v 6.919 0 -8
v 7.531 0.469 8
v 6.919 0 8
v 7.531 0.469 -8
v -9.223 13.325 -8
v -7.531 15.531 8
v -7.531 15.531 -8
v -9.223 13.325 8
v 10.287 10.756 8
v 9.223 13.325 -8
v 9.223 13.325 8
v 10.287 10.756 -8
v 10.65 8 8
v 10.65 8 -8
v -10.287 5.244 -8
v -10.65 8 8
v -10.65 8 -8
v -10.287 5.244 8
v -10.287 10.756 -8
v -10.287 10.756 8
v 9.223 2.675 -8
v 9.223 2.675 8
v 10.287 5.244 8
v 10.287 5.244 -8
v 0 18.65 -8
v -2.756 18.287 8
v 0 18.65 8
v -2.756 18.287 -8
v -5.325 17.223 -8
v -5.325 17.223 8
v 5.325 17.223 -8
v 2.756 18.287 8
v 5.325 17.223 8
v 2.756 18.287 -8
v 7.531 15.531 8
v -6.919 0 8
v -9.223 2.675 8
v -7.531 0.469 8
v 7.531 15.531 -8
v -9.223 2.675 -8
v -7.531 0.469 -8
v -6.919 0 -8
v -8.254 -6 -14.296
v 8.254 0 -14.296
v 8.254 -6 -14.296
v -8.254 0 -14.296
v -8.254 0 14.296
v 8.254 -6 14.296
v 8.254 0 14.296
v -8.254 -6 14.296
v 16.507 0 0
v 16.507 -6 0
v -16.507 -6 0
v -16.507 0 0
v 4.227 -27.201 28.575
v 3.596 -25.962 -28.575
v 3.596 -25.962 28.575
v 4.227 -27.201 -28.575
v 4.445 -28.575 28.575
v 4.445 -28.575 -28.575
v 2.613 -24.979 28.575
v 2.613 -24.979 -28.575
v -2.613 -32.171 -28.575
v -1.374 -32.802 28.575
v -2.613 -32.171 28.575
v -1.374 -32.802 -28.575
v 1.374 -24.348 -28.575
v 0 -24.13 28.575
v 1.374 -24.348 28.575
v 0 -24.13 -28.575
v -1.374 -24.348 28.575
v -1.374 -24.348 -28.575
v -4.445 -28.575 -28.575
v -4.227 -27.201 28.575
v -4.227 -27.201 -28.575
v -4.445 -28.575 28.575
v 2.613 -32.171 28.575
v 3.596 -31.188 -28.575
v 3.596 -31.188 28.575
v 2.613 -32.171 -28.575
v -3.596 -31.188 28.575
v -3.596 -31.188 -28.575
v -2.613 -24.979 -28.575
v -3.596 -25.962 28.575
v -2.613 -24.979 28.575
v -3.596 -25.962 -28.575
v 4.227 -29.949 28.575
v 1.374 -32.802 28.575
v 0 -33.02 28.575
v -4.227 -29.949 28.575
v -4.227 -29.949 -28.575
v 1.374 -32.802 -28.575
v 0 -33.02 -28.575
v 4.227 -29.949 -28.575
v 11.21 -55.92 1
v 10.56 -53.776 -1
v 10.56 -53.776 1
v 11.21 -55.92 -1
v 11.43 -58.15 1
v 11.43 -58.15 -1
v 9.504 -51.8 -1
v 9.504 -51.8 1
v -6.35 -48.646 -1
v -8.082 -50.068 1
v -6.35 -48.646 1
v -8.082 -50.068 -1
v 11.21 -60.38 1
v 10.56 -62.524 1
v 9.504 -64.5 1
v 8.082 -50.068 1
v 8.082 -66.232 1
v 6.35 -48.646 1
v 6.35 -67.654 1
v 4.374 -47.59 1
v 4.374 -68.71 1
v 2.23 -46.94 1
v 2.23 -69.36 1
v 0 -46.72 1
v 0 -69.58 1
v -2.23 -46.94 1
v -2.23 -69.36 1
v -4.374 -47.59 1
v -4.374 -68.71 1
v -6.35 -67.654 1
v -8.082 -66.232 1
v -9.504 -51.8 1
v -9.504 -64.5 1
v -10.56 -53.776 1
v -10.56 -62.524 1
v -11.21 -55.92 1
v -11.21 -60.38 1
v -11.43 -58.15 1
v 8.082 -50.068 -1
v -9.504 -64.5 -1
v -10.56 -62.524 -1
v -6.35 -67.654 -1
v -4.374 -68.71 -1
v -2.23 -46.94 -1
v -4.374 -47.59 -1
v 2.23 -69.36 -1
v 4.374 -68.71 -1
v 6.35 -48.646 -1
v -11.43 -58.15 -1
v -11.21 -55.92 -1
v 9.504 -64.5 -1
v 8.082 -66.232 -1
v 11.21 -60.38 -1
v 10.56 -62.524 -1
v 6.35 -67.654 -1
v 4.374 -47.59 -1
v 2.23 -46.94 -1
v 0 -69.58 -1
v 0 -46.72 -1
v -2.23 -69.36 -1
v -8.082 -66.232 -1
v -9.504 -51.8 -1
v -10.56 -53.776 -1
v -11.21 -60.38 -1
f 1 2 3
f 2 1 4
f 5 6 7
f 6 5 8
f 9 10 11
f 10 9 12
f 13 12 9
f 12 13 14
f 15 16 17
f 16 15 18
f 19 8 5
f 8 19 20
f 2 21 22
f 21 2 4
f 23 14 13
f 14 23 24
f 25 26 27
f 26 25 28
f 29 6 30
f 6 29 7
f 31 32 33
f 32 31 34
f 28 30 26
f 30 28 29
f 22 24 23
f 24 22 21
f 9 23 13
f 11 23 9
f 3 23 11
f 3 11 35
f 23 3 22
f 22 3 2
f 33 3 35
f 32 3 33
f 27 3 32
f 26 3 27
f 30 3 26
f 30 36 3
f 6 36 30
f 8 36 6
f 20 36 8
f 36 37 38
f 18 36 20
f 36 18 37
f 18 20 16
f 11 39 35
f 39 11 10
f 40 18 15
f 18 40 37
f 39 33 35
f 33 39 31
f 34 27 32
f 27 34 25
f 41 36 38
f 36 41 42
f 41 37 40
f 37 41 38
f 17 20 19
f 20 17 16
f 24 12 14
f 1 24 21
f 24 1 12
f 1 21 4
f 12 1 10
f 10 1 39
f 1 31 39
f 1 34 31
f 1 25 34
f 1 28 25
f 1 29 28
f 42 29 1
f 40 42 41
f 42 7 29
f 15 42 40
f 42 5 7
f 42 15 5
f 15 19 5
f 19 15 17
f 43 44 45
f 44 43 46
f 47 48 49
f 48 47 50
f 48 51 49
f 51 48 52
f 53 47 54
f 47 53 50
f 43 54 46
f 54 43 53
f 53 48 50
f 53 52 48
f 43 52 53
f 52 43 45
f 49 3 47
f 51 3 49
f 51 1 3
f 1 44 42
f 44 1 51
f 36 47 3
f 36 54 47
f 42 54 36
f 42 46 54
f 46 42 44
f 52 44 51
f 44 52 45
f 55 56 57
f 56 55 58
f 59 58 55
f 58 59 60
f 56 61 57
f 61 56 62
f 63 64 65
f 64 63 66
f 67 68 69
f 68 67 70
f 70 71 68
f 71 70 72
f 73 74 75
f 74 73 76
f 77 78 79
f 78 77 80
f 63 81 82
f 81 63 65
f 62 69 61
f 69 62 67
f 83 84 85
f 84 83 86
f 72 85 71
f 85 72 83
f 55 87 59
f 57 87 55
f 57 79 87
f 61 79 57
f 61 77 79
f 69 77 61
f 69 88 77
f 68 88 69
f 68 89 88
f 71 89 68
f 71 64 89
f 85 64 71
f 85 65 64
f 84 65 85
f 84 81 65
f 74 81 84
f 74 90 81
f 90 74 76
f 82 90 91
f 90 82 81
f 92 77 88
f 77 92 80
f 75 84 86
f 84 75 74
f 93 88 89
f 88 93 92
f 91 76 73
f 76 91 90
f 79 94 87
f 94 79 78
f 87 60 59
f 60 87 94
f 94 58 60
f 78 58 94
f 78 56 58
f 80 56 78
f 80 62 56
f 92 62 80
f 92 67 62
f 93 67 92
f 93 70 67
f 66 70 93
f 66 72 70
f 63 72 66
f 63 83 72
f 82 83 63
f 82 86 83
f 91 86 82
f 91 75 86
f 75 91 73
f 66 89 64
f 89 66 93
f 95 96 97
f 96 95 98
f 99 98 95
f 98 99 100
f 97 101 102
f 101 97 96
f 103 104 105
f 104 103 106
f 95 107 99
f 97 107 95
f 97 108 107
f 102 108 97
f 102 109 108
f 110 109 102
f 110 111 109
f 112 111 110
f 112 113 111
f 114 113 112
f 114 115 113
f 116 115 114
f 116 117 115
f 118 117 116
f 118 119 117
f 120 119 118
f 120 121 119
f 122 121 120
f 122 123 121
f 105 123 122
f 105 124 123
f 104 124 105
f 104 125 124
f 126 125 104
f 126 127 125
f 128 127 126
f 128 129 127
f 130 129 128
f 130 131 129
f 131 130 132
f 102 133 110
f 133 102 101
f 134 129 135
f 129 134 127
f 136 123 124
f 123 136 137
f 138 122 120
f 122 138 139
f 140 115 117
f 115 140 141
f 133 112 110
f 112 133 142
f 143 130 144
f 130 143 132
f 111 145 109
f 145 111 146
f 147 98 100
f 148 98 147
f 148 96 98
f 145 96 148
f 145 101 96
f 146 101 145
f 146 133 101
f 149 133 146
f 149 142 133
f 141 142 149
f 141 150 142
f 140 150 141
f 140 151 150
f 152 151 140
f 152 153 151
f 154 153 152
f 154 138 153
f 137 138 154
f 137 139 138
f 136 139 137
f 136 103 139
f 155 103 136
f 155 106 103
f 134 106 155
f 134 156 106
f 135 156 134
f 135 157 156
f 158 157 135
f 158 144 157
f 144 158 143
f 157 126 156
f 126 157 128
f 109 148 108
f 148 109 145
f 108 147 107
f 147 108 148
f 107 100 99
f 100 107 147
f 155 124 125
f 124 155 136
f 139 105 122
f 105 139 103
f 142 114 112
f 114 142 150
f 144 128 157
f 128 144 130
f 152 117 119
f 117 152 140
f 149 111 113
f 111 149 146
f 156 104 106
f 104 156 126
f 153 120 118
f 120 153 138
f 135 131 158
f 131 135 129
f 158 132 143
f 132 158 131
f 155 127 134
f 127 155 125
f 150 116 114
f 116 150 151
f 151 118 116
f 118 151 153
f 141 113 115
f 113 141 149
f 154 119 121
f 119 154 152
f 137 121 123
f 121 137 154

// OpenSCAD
// Auto-generated by scripts/author_from_manifest.py (Phase D.3).
// Source: data/phase_d_manifest.json (sku_intent='tyco-ty4251-pendent-k80-286f').
// Do not hand-edit — regenerate from the manifest.
//
// @part tyco_ty4251_pendent_k80_286f
// @kind sprinkler_head
// @category head.pendant.k80
// @display-name "Tyco TY4251 Pendent K8.0 SR 286°F"
// @mfg tyco_fire_protection
// @mfg-pn TY4251
// @listing UL FM
// @hazard-classes OH1 OH2
// @price-usd 16.90
// @install-minutes 8
// @crew journeyman
// @k-factor 8
// @orientation pendant
// @response standard
// @temperature 286F
// @param size_in number default=0.5 label="Size" unit="in"
// @port inlet position=[0,0.014,0] direction=[0,1,0] style=NPT_threaded size_in=0.5 role=drop

size_in = 0.5;
k_factor = 8.0;

length_mm   = 57.15;
body_dia_mm = 25.40;
thread_od   = 21.3;
thread_len  = 16;
deflector_d = body_dia_mm * 0.9;

 union() {
    translate([0, thread_len/2, 0])
        cylinder(h = thread_len, d = thread_od, center = true, $fn = 24);
    translate([0, -3, 0])
        rotate([90, 0, 0])
        cylinder(h = 6, d = thread_od * 1.55, $fn = 6, center = true);
    translate([0, -length_mm/2, 0])
        cylinder(h = length_mm, d = body_dia_mm * 0.35, center = true, $fn = 20);
    translate([0, -length_mm - 1, 0])
        cylinder(h = 2, d = deflector_d, center = true, $fn = 32);
}
